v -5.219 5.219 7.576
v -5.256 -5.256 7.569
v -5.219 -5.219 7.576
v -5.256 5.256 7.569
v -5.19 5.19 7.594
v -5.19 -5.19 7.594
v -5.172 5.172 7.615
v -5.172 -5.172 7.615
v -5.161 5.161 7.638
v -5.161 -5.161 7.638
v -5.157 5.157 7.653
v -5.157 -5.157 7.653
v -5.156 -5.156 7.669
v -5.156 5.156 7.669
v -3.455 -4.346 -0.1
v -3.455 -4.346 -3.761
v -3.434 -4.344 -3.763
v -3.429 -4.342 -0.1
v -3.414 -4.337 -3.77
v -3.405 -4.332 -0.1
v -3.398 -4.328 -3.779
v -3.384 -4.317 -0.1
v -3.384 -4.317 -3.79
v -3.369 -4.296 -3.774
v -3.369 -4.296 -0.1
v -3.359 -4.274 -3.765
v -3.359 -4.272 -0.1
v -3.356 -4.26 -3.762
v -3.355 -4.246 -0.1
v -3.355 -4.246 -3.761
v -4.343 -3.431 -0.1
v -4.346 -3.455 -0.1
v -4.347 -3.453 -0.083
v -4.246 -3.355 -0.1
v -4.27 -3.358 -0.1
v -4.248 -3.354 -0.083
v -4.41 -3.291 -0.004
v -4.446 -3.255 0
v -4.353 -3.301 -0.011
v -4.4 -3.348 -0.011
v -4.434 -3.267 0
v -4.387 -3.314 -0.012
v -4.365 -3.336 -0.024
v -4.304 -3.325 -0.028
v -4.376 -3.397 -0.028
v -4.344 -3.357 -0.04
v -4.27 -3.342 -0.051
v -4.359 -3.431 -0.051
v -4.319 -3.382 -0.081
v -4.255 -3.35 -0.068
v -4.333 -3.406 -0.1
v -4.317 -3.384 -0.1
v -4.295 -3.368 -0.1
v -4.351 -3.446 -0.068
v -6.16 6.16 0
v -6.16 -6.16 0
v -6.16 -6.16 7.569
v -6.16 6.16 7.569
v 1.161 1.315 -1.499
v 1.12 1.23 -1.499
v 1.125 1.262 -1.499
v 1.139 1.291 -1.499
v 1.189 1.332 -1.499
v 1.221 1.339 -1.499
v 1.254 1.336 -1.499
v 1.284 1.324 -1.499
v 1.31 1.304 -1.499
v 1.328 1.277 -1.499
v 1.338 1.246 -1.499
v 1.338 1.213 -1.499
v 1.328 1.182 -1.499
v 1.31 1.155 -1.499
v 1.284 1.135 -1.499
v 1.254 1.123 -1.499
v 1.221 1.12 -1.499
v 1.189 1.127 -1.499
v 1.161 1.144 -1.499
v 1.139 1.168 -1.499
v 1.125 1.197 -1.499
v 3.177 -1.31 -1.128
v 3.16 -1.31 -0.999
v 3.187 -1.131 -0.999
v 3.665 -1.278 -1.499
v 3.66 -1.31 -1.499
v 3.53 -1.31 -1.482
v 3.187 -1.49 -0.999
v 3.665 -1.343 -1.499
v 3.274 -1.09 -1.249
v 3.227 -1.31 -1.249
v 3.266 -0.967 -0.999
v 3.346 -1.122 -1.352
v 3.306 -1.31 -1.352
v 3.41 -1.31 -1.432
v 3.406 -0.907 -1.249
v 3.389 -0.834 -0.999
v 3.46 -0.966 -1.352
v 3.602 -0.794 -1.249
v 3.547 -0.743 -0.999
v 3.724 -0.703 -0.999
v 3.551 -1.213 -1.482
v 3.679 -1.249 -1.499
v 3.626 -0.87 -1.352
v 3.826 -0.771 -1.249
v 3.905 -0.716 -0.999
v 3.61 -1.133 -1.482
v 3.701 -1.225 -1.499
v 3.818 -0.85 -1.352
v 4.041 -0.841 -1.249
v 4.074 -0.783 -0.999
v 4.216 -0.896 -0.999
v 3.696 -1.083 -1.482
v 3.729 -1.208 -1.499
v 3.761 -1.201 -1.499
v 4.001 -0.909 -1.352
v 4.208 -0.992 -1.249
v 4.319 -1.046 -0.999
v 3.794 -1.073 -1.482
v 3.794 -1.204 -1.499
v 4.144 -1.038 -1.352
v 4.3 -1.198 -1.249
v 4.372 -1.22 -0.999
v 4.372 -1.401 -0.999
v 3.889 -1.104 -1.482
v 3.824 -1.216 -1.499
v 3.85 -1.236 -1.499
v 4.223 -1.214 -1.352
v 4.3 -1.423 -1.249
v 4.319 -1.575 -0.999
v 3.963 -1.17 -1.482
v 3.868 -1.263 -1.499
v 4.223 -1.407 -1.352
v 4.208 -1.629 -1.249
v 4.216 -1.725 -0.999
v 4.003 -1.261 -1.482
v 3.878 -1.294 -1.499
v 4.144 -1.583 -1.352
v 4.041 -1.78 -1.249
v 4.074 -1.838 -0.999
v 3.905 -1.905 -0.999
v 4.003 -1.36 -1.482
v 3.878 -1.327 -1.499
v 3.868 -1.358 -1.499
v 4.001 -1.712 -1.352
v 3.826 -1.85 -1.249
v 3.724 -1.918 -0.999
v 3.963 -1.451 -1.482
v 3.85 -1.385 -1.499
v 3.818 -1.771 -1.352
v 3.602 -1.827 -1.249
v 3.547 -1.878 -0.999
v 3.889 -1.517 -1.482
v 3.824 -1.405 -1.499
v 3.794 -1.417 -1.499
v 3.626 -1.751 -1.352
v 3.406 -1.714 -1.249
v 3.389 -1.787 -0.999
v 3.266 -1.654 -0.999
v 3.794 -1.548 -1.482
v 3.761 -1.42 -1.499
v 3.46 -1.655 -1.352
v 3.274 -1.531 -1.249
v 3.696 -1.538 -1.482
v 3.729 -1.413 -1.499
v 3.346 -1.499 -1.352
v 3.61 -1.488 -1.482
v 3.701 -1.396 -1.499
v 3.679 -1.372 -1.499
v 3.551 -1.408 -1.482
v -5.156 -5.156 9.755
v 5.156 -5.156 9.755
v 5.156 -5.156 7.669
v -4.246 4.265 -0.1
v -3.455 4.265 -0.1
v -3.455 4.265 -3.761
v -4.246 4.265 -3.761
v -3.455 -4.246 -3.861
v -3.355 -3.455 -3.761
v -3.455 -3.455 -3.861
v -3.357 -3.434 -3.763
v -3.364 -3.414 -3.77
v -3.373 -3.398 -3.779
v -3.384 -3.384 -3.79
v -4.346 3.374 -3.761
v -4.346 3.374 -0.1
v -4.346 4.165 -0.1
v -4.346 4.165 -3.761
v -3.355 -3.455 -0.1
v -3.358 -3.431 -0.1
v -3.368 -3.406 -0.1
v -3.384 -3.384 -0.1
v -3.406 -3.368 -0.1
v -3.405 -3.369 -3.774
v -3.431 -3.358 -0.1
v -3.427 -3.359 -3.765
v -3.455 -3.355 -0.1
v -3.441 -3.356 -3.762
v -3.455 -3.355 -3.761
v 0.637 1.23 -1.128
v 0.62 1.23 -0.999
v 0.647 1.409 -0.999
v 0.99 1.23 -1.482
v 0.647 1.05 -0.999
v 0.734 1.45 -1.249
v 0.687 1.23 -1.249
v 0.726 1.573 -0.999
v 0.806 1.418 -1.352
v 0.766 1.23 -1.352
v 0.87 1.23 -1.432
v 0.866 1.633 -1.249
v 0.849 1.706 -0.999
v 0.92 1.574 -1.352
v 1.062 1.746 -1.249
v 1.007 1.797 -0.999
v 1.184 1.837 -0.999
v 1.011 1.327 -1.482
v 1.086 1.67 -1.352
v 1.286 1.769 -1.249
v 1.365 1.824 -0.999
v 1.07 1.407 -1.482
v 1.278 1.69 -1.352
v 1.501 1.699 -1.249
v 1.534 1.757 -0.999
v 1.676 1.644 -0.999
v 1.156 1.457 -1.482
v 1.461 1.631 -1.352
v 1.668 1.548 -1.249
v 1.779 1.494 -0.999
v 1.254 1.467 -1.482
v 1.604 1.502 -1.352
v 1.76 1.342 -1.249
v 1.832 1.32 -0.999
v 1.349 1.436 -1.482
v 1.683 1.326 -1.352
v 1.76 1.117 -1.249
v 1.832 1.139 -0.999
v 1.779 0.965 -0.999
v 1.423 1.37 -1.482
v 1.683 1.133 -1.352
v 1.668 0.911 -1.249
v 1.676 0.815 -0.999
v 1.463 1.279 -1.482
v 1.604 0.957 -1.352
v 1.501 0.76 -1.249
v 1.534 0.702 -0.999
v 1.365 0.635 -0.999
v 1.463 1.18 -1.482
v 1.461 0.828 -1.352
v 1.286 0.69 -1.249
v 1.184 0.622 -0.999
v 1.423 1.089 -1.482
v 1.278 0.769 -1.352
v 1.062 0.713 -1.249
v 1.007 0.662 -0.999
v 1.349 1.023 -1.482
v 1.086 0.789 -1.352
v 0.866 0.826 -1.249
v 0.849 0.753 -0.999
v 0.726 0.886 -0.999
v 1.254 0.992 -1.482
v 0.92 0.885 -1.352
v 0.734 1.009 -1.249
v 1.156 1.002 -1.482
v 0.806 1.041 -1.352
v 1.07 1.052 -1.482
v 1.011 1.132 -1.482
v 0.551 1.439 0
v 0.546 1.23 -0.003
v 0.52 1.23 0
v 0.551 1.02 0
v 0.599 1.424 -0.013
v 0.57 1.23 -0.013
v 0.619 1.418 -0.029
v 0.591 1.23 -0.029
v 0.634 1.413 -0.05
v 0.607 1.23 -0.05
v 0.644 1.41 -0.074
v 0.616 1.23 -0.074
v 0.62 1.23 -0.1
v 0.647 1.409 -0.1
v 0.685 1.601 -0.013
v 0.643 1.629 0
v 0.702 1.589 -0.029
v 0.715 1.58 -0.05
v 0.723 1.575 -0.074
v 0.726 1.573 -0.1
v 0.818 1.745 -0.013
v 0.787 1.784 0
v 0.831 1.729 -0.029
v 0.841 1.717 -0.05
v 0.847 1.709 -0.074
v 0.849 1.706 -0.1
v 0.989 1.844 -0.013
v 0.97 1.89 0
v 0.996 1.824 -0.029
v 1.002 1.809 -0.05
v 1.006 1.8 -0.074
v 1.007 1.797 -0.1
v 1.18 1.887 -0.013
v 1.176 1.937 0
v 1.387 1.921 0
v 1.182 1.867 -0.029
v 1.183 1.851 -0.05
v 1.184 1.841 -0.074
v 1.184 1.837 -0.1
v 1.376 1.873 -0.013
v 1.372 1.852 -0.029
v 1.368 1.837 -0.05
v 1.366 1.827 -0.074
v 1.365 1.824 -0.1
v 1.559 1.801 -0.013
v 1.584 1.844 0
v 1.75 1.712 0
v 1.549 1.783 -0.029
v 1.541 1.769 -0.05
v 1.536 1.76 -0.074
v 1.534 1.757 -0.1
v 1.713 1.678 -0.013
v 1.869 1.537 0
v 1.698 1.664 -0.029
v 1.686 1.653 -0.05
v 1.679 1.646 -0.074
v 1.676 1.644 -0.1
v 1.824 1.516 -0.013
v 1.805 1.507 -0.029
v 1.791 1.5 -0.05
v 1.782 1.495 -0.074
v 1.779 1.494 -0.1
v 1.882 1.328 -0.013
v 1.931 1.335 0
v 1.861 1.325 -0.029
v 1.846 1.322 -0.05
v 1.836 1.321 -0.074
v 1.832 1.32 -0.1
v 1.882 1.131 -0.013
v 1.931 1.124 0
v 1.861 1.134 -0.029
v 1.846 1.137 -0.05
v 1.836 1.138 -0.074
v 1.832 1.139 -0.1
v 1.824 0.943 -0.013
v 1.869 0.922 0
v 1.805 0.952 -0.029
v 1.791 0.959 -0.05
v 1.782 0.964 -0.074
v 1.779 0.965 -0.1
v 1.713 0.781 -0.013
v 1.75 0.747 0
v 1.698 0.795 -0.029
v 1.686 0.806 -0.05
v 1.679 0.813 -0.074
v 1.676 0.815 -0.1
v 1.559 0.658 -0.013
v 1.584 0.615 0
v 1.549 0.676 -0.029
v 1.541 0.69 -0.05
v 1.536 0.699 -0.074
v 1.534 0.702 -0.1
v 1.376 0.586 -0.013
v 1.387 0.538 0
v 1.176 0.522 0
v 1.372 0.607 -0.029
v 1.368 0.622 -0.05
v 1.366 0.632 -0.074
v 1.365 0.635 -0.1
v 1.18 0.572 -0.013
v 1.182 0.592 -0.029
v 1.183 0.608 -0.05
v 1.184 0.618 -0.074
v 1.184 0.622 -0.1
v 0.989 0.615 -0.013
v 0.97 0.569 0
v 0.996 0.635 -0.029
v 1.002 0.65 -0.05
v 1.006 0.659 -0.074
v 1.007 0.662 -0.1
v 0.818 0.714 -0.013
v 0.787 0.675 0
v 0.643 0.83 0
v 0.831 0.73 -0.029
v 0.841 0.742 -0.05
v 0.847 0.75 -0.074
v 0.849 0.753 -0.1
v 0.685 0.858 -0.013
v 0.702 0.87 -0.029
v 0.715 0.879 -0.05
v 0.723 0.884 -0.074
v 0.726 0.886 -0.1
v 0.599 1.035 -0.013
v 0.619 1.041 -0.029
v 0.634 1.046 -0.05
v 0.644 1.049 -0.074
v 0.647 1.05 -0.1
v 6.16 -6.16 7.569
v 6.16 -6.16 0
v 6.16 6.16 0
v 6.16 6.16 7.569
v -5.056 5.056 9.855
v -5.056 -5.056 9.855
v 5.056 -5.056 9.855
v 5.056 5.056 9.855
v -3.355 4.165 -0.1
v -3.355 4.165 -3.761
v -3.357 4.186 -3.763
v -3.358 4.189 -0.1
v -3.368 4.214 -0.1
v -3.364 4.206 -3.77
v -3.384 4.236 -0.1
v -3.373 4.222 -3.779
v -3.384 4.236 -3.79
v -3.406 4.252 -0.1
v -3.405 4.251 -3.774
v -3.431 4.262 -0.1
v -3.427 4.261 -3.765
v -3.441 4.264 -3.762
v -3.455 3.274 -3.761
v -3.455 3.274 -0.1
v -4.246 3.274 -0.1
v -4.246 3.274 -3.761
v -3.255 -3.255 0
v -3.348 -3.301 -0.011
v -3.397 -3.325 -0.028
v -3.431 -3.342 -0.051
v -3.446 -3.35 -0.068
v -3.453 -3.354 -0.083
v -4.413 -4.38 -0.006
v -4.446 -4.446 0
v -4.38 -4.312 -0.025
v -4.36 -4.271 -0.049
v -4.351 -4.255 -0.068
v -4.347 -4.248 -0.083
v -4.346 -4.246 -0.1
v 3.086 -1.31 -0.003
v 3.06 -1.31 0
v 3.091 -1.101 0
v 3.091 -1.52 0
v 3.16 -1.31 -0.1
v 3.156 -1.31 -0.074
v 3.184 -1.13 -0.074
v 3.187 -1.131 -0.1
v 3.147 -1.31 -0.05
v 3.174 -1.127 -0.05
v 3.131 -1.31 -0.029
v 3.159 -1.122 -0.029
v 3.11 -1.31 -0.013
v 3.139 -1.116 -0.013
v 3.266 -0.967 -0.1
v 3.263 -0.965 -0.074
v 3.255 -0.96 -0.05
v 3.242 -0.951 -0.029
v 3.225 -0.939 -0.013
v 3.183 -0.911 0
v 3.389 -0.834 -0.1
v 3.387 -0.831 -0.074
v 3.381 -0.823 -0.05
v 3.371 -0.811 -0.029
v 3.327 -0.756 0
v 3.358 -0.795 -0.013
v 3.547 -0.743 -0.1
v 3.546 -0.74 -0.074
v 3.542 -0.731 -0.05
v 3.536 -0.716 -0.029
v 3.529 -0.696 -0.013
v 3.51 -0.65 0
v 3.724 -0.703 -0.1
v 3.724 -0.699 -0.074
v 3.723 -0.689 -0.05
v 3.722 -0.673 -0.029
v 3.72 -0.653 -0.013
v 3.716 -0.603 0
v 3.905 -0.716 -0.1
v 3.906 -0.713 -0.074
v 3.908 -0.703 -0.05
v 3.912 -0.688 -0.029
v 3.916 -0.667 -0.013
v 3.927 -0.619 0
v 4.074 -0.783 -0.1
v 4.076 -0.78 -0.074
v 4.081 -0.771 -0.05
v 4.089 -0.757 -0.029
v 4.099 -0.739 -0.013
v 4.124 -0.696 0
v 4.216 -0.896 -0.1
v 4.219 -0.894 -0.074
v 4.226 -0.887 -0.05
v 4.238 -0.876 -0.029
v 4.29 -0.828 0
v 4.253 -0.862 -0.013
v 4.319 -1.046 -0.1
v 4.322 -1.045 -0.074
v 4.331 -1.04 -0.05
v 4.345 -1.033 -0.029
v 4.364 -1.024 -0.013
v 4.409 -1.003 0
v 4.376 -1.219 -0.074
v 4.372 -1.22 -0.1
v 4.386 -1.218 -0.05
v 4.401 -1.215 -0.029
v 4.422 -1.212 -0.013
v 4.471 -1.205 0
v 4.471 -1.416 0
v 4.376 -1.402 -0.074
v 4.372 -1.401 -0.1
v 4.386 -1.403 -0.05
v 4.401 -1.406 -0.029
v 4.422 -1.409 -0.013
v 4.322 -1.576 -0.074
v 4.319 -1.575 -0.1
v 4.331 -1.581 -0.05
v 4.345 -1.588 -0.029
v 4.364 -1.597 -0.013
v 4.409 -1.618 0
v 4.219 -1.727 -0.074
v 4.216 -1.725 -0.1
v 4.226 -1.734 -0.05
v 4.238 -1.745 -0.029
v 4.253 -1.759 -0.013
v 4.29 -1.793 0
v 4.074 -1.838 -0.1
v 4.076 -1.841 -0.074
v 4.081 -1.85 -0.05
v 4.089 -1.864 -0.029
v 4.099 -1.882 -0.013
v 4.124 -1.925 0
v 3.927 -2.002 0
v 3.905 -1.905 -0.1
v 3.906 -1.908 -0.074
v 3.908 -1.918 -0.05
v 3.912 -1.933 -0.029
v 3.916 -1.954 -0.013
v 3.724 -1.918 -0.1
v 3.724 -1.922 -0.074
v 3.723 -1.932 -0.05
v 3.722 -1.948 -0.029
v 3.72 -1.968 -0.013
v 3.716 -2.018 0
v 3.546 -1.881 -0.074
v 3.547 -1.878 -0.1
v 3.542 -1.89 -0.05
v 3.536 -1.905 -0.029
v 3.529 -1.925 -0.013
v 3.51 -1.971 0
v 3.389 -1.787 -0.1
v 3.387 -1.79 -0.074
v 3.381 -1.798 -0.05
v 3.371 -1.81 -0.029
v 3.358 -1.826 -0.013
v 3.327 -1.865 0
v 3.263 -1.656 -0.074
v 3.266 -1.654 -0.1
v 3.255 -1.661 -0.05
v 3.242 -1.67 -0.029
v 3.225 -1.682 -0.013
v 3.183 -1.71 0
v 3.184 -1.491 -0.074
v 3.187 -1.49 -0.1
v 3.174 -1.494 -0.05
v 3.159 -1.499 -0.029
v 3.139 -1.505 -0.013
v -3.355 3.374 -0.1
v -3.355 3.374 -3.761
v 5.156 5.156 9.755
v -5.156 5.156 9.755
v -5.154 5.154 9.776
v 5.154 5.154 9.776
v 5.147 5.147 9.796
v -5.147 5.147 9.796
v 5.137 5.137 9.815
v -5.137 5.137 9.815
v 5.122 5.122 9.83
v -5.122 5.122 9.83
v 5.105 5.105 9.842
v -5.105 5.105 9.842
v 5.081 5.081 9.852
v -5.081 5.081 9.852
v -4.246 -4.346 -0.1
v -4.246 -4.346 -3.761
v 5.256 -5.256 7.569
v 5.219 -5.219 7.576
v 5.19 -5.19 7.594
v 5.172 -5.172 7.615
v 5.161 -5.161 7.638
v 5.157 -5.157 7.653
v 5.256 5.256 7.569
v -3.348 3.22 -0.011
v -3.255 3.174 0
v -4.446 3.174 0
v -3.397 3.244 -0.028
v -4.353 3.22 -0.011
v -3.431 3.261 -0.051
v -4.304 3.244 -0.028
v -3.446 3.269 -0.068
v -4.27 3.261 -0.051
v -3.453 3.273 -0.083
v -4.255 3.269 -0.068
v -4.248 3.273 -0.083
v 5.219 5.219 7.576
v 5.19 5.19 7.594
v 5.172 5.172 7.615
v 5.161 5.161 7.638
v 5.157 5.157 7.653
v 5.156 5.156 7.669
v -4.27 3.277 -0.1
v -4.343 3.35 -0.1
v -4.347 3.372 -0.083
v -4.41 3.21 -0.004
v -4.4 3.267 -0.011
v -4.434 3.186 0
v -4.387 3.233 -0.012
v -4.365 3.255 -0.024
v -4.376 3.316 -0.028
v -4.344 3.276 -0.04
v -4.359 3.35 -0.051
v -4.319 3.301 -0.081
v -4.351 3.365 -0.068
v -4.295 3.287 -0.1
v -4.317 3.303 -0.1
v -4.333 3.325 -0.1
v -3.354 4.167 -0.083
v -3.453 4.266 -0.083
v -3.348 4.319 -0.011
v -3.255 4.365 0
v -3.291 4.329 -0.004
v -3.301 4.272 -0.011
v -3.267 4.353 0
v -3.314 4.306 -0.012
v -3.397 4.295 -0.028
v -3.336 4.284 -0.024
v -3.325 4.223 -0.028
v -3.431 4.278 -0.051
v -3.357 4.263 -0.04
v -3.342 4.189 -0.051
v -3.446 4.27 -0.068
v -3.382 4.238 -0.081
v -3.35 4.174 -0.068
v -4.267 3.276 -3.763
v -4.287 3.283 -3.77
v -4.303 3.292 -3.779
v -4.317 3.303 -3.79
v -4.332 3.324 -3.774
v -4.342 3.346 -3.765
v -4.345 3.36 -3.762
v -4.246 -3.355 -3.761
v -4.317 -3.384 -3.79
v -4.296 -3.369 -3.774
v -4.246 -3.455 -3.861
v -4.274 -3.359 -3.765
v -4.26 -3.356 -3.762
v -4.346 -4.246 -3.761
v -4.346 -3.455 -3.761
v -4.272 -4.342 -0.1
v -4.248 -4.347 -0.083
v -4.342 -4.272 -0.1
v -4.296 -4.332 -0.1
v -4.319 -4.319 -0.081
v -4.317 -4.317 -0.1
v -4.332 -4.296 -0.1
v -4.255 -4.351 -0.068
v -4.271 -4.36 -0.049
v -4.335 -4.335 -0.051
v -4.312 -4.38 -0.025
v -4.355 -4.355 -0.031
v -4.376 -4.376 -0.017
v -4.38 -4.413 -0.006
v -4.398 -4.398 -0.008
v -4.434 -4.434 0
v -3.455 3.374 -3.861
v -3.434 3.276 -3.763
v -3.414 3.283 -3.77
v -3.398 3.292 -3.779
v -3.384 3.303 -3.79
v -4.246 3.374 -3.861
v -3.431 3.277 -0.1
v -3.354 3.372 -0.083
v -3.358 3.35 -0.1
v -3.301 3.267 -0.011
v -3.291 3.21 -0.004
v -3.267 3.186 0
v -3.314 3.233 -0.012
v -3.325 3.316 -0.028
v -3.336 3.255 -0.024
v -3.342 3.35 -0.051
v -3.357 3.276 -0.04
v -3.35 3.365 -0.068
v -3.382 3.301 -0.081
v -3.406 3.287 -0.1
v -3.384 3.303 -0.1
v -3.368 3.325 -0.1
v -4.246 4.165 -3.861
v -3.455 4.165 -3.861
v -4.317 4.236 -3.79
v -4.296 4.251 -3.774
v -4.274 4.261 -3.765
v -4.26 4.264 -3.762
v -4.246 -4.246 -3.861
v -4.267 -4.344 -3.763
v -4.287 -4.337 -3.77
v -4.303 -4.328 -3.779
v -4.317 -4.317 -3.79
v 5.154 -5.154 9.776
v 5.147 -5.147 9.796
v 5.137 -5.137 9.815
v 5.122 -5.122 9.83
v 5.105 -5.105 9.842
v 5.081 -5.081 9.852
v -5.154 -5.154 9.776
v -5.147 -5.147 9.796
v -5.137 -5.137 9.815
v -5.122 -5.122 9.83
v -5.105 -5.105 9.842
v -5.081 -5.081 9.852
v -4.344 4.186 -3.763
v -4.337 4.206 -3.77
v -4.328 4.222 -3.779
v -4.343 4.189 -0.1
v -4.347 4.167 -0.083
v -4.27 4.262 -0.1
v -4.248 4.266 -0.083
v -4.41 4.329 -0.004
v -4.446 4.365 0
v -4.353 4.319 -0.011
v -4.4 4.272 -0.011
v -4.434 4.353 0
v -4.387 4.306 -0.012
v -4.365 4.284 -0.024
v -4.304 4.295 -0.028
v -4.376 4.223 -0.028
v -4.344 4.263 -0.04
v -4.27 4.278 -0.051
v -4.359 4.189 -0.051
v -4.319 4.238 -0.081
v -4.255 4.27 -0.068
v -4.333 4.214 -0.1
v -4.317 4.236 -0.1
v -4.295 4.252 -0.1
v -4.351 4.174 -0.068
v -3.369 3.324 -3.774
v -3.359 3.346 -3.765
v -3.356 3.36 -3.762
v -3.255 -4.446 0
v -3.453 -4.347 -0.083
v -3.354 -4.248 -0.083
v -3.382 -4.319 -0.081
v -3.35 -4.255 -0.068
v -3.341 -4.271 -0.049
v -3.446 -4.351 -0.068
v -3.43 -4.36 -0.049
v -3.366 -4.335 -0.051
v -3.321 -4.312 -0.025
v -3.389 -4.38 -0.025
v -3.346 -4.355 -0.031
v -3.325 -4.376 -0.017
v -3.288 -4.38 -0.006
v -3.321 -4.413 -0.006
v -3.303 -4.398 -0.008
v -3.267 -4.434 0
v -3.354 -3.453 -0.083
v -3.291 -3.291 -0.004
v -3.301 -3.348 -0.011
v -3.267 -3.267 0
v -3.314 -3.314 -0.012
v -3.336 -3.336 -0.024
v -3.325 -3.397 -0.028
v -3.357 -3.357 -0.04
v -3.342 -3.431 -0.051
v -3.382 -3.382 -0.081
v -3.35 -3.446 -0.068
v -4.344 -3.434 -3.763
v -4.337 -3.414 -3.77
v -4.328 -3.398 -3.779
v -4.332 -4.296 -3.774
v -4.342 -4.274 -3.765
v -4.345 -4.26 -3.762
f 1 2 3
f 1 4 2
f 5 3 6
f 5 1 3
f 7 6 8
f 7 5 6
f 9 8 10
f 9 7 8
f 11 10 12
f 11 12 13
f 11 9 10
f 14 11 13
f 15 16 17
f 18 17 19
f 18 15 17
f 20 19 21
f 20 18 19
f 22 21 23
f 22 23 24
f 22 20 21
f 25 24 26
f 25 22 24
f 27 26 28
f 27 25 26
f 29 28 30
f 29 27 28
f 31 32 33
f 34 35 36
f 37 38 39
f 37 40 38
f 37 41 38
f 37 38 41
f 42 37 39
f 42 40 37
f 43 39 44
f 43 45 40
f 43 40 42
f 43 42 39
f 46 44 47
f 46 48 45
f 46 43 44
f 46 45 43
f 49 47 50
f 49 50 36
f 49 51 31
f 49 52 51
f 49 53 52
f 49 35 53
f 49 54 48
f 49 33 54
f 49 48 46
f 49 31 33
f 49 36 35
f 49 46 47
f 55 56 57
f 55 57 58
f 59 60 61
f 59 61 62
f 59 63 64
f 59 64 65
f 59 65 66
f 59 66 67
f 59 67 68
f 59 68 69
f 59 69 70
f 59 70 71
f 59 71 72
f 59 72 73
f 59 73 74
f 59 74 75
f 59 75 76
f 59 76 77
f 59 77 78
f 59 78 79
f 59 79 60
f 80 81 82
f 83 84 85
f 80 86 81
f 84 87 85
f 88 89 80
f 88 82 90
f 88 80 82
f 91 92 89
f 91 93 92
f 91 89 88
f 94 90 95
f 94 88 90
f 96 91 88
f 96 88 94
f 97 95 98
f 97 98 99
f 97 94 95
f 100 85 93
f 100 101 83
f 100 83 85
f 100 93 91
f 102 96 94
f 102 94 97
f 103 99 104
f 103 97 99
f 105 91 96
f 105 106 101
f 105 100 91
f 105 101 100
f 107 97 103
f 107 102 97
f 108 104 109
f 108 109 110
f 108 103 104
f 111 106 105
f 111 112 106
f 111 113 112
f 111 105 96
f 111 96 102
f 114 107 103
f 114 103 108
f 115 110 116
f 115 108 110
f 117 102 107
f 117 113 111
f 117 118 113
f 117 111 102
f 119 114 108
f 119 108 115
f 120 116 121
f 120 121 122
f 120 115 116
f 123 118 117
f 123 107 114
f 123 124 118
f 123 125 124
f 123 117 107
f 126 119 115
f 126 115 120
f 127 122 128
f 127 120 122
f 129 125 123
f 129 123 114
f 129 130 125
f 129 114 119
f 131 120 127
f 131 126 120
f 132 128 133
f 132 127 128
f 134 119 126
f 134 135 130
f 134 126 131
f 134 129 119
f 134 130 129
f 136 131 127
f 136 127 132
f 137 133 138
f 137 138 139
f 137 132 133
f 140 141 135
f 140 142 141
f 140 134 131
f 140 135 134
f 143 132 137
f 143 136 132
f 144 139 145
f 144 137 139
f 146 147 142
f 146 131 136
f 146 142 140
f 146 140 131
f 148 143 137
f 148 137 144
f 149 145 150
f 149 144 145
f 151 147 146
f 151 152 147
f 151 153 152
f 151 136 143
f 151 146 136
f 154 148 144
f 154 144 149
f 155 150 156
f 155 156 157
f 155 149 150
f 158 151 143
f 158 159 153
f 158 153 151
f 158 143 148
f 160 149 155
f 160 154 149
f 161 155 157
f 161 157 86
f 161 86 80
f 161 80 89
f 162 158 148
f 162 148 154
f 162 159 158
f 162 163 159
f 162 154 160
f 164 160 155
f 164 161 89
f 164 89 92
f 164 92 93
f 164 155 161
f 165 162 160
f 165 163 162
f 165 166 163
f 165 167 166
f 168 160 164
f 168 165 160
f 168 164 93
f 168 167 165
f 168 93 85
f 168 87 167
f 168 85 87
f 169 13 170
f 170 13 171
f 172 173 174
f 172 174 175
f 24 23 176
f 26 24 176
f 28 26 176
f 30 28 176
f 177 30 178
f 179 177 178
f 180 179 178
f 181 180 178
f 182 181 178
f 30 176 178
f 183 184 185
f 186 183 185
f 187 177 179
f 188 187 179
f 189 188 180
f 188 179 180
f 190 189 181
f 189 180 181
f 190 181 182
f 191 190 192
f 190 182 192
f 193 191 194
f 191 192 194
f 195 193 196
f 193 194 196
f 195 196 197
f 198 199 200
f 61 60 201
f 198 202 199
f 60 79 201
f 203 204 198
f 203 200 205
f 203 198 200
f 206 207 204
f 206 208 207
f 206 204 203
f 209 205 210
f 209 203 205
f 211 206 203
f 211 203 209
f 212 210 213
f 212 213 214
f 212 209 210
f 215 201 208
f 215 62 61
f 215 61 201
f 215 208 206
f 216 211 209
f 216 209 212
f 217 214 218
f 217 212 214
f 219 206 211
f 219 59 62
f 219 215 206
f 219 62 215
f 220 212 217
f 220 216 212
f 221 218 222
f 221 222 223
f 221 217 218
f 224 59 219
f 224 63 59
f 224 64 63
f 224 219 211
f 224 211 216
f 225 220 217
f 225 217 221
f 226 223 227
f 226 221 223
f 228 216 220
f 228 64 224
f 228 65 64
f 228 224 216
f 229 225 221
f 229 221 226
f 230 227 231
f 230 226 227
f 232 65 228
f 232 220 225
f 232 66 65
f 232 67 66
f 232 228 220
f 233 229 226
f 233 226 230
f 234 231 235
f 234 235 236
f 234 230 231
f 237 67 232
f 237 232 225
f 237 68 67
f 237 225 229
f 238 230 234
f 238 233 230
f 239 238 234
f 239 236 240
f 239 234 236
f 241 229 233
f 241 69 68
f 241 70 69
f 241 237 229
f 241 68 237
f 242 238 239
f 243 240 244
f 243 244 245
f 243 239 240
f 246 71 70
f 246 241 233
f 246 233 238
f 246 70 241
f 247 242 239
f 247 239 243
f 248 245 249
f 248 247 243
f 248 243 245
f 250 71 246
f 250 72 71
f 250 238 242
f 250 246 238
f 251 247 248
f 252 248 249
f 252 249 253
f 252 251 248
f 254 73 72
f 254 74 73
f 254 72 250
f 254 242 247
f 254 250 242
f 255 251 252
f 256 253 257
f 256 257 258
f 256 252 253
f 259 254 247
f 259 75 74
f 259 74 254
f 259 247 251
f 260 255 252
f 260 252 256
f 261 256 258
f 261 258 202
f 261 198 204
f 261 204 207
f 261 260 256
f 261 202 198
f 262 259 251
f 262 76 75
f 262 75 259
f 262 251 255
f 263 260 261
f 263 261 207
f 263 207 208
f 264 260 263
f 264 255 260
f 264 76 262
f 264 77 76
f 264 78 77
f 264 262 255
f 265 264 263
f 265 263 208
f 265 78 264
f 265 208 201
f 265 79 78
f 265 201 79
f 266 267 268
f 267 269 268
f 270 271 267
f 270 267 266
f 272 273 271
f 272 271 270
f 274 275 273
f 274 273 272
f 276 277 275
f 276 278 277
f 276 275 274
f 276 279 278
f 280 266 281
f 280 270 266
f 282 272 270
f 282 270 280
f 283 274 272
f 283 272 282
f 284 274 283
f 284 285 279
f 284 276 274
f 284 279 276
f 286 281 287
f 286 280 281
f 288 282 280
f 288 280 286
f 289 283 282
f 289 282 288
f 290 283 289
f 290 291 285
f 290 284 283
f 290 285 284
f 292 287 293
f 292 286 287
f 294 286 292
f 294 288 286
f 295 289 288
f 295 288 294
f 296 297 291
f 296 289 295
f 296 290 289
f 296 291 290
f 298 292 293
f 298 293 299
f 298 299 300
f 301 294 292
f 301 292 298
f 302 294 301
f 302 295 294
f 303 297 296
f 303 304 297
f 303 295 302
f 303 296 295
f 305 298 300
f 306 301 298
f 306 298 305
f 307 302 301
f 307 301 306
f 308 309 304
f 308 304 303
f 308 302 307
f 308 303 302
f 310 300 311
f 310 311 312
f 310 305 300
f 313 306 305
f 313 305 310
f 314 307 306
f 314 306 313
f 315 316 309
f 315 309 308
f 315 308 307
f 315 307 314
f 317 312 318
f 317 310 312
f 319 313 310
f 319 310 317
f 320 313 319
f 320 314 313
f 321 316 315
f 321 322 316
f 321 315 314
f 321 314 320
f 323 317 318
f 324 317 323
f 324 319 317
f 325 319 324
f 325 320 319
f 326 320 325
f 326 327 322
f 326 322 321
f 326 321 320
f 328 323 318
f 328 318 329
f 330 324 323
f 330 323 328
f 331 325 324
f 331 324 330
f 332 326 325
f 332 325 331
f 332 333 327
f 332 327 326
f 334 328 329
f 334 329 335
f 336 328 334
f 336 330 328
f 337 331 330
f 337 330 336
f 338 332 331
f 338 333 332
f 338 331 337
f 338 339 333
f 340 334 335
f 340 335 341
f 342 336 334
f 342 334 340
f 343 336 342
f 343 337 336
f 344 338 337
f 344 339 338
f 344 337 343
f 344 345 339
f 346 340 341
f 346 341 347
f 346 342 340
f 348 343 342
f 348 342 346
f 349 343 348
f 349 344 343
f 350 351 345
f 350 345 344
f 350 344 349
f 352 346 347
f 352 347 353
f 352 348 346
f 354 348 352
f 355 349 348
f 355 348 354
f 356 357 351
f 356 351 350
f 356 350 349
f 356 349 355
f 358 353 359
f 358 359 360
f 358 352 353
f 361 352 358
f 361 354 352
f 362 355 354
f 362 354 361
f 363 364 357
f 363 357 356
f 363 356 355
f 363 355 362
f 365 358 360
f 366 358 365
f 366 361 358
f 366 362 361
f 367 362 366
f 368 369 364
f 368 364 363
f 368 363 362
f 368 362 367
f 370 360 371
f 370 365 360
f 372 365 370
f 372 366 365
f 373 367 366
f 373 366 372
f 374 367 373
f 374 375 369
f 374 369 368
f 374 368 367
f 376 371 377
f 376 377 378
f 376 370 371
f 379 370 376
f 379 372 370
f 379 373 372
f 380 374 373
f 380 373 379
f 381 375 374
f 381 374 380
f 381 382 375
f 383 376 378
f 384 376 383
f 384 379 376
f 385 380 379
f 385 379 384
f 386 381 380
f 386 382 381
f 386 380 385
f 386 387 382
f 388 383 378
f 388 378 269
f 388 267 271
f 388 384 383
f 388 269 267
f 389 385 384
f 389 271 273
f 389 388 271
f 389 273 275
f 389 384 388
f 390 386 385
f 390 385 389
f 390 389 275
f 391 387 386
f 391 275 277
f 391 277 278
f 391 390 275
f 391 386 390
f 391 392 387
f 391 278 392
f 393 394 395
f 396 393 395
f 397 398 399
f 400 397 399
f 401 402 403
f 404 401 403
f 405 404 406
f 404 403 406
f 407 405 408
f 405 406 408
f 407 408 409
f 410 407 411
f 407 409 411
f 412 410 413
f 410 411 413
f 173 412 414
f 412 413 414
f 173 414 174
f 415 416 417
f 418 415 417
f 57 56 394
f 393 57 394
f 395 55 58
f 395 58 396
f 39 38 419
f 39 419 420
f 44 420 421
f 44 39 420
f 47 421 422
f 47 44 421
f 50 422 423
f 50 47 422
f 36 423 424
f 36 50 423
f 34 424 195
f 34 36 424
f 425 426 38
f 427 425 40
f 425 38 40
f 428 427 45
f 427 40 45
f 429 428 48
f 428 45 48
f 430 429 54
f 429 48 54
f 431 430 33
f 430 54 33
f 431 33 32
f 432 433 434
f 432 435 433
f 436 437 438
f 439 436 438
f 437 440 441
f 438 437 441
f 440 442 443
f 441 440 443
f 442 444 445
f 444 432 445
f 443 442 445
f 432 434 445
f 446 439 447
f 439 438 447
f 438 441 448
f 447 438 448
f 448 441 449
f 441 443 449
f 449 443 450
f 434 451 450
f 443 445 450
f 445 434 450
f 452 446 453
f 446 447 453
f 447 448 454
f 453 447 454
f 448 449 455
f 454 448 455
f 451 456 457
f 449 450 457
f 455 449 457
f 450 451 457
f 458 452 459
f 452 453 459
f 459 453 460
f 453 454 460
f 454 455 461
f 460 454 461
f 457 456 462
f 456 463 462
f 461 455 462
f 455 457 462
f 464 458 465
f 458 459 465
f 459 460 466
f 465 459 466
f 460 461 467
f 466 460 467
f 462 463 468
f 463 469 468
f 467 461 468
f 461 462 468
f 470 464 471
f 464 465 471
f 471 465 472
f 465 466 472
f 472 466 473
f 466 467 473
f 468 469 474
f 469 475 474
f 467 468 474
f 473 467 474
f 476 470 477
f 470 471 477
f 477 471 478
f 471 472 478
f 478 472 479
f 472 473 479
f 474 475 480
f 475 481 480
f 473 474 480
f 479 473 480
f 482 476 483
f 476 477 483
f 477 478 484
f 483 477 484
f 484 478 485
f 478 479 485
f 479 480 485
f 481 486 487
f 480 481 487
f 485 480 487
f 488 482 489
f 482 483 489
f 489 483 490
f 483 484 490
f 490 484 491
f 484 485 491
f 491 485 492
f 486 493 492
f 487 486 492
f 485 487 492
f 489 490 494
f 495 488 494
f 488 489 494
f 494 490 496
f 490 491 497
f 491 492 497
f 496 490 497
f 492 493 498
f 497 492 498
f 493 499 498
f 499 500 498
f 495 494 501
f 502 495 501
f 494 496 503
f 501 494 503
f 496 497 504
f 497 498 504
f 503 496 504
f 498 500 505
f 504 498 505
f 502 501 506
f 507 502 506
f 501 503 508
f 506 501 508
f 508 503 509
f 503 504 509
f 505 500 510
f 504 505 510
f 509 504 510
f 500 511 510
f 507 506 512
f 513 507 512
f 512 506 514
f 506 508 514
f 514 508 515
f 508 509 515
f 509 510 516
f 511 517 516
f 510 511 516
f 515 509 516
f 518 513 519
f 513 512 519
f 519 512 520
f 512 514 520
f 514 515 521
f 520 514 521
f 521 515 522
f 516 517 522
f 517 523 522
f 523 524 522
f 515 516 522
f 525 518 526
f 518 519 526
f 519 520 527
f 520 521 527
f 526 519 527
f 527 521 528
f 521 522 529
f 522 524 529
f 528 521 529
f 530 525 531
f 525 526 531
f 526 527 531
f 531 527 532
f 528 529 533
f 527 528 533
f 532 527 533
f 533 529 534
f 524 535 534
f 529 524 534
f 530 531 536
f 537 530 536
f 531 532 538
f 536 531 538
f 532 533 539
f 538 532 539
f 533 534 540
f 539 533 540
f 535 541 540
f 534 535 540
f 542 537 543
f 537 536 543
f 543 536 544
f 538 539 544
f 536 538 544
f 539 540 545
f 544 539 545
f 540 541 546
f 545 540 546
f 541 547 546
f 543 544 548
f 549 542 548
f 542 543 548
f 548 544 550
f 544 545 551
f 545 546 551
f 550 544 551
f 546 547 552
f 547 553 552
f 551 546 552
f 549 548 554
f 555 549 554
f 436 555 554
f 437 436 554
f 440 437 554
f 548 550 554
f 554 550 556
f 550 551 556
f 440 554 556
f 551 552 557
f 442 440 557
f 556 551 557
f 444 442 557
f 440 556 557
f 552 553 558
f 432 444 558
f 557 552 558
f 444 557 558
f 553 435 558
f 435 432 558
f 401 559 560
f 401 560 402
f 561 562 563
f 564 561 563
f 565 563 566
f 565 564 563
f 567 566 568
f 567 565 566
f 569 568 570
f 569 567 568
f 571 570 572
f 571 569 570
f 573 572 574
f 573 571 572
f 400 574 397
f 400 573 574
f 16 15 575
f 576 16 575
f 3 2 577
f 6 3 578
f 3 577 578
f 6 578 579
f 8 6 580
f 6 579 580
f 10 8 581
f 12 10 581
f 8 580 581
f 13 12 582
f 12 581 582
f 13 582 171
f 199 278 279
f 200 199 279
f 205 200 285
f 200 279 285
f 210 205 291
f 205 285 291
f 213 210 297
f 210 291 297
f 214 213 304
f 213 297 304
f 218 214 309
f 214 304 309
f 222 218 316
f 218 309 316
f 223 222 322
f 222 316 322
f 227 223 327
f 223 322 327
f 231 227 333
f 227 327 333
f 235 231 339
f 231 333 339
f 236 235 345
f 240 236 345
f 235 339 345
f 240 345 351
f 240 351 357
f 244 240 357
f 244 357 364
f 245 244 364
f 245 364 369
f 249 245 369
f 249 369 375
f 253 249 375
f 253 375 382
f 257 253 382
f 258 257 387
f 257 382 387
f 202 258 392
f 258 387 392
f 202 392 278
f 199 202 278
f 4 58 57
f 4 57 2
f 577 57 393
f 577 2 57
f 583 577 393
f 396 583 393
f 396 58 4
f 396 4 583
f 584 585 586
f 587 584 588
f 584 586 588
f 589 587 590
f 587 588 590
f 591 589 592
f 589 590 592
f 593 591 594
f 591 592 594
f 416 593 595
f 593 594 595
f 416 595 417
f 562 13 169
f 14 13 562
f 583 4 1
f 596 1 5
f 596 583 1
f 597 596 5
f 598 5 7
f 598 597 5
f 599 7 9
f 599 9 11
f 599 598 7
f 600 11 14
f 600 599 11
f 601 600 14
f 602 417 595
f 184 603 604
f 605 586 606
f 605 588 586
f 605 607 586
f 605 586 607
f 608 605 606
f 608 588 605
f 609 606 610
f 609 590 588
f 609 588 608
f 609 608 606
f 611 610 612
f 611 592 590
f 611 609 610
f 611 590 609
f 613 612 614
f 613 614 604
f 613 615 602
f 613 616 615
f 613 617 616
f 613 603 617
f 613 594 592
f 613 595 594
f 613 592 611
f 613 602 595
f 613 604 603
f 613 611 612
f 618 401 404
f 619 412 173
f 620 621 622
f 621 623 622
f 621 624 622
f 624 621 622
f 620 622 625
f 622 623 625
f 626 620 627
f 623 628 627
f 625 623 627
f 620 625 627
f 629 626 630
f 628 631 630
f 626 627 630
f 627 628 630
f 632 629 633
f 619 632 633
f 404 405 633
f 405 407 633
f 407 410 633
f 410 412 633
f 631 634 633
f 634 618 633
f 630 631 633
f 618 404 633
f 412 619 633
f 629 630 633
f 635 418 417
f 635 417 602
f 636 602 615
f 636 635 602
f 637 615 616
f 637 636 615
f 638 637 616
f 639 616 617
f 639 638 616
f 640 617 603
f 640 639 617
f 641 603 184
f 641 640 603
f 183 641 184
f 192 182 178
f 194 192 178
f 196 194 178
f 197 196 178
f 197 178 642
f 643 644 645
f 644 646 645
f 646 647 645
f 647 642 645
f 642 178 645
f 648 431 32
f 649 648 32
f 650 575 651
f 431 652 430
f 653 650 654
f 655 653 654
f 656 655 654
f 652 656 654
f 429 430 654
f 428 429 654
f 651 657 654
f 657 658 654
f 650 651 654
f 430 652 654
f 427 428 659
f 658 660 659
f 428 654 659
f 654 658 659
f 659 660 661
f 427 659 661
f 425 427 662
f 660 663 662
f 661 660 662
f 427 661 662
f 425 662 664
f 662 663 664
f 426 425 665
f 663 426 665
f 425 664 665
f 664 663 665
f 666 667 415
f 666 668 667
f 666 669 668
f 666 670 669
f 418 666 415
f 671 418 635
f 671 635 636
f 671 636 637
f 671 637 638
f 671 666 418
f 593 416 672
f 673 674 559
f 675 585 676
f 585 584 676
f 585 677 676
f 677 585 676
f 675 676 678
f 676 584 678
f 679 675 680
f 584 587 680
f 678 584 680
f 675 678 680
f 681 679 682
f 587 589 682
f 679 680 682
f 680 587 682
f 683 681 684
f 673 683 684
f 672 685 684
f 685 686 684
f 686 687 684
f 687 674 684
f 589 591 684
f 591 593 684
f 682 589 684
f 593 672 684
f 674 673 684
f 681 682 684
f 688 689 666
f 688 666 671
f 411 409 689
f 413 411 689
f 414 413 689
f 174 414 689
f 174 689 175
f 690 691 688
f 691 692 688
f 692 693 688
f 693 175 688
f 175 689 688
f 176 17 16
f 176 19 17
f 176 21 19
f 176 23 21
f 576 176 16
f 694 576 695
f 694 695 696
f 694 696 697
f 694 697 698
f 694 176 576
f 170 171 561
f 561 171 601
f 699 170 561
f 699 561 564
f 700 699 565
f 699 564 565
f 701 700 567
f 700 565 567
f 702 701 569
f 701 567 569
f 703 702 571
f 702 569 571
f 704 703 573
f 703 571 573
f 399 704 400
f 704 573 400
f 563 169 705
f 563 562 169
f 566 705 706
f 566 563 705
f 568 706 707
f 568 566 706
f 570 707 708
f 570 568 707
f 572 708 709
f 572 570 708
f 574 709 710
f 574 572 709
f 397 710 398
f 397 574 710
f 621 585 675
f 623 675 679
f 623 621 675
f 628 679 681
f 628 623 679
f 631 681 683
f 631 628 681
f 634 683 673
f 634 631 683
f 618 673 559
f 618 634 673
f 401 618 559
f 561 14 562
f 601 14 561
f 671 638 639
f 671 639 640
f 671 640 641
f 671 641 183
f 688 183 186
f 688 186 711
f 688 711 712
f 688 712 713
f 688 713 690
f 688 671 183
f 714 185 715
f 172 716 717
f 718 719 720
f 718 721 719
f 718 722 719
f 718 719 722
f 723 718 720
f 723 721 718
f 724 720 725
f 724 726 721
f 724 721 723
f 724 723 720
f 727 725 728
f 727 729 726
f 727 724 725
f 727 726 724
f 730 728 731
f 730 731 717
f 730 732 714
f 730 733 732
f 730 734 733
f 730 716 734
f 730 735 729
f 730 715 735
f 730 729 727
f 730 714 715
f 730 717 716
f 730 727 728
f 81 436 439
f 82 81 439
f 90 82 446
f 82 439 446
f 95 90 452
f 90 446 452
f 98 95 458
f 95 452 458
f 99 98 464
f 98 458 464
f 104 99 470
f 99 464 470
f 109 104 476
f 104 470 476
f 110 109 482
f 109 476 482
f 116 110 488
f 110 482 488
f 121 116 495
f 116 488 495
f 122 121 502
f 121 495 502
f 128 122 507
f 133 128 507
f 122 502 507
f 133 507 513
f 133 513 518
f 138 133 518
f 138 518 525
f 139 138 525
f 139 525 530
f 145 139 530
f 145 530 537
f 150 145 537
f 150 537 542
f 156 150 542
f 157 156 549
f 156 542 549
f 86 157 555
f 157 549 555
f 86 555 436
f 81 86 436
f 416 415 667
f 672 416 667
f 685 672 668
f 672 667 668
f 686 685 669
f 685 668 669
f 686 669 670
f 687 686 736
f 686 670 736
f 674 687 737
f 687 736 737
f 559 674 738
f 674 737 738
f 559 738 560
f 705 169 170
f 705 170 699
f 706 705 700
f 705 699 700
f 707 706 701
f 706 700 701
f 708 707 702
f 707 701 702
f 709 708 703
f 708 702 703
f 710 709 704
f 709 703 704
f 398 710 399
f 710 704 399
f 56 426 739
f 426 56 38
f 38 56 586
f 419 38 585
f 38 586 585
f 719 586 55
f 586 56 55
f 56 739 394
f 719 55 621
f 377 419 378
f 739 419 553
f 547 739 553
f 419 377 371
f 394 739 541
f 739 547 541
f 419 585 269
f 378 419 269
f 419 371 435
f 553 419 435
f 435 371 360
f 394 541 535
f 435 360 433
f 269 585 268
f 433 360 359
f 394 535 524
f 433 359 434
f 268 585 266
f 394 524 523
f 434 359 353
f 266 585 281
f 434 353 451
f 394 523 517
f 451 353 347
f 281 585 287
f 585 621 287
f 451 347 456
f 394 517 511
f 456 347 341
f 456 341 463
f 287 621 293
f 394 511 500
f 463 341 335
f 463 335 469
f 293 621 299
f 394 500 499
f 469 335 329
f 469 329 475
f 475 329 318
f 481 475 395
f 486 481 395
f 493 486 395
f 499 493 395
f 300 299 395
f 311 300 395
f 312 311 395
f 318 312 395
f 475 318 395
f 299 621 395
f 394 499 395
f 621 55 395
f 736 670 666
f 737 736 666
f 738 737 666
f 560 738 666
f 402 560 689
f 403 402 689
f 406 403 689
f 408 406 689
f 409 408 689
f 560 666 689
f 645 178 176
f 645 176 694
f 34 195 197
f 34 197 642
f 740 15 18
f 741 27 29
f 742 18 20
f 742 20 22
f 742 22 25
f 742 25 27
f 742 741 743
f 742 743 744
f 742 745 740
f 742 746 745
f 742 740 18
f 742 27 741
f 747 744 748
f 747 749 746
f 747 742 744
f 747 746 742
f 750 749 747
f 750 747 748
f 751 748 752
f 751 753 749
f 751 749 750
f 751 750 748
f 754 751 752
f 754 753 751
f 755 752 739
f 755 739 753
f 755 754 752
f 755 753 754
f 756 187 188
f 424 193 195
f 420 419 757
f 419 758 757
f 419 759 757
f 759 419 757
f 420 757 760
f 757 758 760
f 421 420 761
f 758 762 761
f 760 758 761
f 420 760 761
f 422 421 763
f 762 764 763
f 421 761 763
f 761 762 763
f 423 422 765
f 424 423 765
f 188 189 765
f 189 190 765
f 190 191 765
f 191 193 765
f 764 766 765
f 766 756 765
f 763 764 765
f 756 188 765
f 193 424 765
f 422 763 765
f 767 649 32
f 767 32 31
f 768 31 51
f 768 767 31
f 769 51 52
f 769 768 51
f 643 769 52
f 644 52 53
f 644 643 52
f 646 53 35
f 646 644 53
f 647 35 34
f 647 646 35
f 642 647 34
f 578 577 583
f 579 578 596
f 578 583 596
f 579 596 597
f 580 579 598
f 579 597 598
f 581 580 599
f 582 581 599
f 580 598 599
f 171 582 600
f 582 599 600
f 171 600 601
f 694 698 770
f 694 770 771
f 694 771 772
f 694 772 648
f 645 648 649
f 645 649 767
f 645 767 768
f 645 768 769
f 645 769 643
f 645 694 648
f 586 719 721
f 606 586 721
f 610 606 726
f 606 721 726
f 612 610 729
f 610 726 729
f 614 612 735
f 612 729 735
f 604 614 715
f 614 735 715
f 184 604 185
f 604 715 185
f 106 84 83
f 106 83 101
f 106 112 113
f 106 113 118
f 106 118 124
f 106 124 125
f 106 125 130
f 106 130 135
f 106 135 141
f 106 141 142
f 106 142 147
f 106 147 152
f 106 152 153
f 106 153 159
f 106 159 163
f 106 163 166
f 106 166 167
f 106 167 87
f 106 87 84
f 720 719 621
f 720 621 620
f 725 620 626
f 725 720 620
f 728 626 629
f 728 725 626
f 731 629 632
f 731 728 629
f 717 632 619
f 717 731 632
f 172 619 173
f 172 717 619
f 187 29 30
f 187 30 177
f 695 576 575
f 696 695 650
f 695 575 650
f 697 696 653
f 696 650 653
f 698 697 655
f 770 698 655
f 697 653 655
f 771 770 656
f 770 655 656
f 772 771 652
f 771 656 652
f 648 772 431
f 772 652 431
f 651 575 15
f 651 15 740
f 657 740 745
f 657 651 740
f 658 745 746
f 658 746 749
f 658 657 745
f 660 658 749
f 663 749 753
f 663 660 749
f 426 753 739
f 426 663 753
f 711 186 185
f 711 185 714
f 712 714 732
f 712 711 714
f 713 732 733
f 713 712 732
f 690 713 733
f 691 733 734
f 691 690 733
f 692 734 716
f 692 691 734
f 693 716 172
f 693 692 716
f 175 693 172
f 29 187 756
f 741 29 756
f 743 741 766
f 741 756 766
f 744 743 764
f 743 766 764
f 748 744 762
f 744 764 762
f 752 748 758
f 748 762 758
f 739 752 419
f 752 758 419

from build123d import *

# Parameters (mm, degrees)
SKETCH1_W           = 12.319
SKETCH1_H           = 12.319
BOSS_EXTRUDE1_DEPTH = 7.5692
SKETCH2_W           = 10.3124
SKETCH2_H           = 10.3124
BOSS_EXTRUDE2_DEPTH = 2.286
SKETCH3_R           = 0.6096
BOSS_EXTRUDE5_DEPTH = 1.4986
FILLET2_R           = 0.5
FILLET3_R           = 0.1
SKETCH5_W           = 0.9906
SKETCH5_H           = 0.9906
BOSS_EXTRUDE6_DEPTH = 3.8608
CHAMFER1_SIZE       = 0.1
FILLET4_R           = 0.1
FILLET5_R           = 0.1
FILLET6_R           = 0.1
FILLET7_R           = 0.1


with BuildPart() as part:
    # Sketch1 → Boss-Extrude1 (new body)
    with BuildSketch(Plane.XY):
        Rectangle(SKETCH1_W, SKETCH1_H)
    extrude(amount=BOSS_EXTRUDE1_DEPTH)

    # Sketch2 → Boss-Extrude2 (add)
    with BuildSketch(Plane.XY.offset(7.5692)):
        Rectangle(SKETCH2_W, SKETCH2_H)
    extrude(amount=BOSS_EXTRUDE2_DEPTH)

    # Sketch3 → Boss-Extrude5 (add)
    with BuildSketch(Plane(origin=(0, 0, 0), x_dir=(-1, 0, 0), z_dir=(0, 0, -1))):
        with Locations((-1.2295, 1.2295)):
            Circle(SKETCH3_R)
        with Locations((-3.7695, -1.3105)):
            Circle(SKETCH3_R)
    extrude(amount=BOSS_EXTRUDE5_DEPTH)

    # Fillet2
    fillet2_edges = [part.edges().sort_by_distance(p)[0] for p in [
        (1.8391, 1.2295, -1.4986),
        (4.3791, -1.3105, -1.4986),
    ]]
    fillet(fillet2_edges, radius=FILLET2_R)

    # Fillet3
    fillet3_edges = [part.edges().sort_by_distance(p)[0] for p in [
        (1.8391, 1.2295, 0),
        (4.3791, -1.3105, 0),
    ]]
    fillet(fillet3_edges, radius=FILLET3_R)

    # Sketch5 → Boss-Extrude6 (add)
    with BuildSketch(Plane(origin=(0, 0, 0), x_dir=(-1, 0, 0), z_dir=(0, 0, -1))):
        with Locations((3.8505, -3.8505)):
            Rectangle(SKETCH5_W, SKETCH5_H)
        with Locations((3.8505, 3.7695)):
            Rectangle(SKETCH5_W, SKETCH5_H)
    extrude(amount=BOSS_EXTRUDE6_DEPTH)

    # Chamfer1
    chamfer1_edges = [part.edges().sort_by_distance(p)[0] for p in [
        (-3.8505, -3.3552, -3.8608),
        (-3.3552, -3.8505, -3.8608),
        (-3.8505, -4.3458, -3.8608),
        (-4.3458, -3.8505, -3.8608),
        (-3.3552, 3.7695, -3.8608),
        (-3.8505, 4.2648, -3.8608),
        (-3.8505, 3.2742, -3.8608),
        (-4.3458, 3.7695, -3.8608),
    ]]
    chamfer(chamfer1_edges, length=CHAMFER1_SIZE)

    # Fillet4
    fillet4_edges = [part.edges().sort_by_distance(p)[0] for p in [
        (-3.8505, -4.3458, 0),
        (-4.3458, -3.8505, 0),
        (-3.8505, -3.3552, 0),
        (-3.3552, -3.8505, 0),
        (-3.8505, 3.2742, 0),
        (-4.3458, 3.7695, 0),
        (-3.3552, 3.7695, 0),
        (-3.8505, 4.2648, 0),
    ]]
    fillet(fillet4_edges, radius=FILLET4_R)

    # Fillet5
    fillet5_edges = [part.edges().sort_by_distance(p)[0] for p in [
        (5.1562, 0, 7.5692),
        (0, 5.1562, 7.5692),
        (-5.1562, 0, 7.5692),
        (0, -5.1562, 7.5692),
    ]]
    fillet(fillet5_edges, radius=FILLET5_R)

    # Fillet6
    fillet6_edges = [part.edges().sort_by_distance(p)[0] for p in [
        (-4.381195109, 3.238804891, -0.023670398),
        (-4.381195109, 4.300195109, -0.023670398),
        (-3.319804891, 3.238804891, -0.023670398),
        (-3.319804891, 4.300195109, -0.023670398),
        (-3.319804891, -4.381195109, -0.023670398),
        (-4.381195109, -4.381195109, -0.023670398),
        (-3.319804891, -3.319804891, -0.023670398),
        (-4.381195109, -3.319804891, -0.023670398),
        (-3.3552, -4.3458, -1.9304),
        (-3.3552, -3.3552, -1.9304),
        (-4.3458, -4.3458, -1.9304),
        (-4.3458, -3.3552, -1.9304),
        (-3.3552, 3.2742, -1.9304),
        (-3.3552, 4.2648, -1.9304),
        (-4.3458, 3.2742, -1.9304),
        (-4.3458, 4.2648, -1.9304),
    ]]
    fillet(fillet6_edges, radius=FILLET6_R)

    # Fillet7
    fillet7_edges = [part.edges().sort_by_distance(p)[0] for p in [
        (5.1562, 0, 9.8552),
        (0, 5.1562, 9.8552),
        (-5.1562, 0, 9.8552),
        (0, -5.1562, 9.8552),
    ]]
    fillet(fillet7_edges, radius=FILLET7_R)


solid = part.part
